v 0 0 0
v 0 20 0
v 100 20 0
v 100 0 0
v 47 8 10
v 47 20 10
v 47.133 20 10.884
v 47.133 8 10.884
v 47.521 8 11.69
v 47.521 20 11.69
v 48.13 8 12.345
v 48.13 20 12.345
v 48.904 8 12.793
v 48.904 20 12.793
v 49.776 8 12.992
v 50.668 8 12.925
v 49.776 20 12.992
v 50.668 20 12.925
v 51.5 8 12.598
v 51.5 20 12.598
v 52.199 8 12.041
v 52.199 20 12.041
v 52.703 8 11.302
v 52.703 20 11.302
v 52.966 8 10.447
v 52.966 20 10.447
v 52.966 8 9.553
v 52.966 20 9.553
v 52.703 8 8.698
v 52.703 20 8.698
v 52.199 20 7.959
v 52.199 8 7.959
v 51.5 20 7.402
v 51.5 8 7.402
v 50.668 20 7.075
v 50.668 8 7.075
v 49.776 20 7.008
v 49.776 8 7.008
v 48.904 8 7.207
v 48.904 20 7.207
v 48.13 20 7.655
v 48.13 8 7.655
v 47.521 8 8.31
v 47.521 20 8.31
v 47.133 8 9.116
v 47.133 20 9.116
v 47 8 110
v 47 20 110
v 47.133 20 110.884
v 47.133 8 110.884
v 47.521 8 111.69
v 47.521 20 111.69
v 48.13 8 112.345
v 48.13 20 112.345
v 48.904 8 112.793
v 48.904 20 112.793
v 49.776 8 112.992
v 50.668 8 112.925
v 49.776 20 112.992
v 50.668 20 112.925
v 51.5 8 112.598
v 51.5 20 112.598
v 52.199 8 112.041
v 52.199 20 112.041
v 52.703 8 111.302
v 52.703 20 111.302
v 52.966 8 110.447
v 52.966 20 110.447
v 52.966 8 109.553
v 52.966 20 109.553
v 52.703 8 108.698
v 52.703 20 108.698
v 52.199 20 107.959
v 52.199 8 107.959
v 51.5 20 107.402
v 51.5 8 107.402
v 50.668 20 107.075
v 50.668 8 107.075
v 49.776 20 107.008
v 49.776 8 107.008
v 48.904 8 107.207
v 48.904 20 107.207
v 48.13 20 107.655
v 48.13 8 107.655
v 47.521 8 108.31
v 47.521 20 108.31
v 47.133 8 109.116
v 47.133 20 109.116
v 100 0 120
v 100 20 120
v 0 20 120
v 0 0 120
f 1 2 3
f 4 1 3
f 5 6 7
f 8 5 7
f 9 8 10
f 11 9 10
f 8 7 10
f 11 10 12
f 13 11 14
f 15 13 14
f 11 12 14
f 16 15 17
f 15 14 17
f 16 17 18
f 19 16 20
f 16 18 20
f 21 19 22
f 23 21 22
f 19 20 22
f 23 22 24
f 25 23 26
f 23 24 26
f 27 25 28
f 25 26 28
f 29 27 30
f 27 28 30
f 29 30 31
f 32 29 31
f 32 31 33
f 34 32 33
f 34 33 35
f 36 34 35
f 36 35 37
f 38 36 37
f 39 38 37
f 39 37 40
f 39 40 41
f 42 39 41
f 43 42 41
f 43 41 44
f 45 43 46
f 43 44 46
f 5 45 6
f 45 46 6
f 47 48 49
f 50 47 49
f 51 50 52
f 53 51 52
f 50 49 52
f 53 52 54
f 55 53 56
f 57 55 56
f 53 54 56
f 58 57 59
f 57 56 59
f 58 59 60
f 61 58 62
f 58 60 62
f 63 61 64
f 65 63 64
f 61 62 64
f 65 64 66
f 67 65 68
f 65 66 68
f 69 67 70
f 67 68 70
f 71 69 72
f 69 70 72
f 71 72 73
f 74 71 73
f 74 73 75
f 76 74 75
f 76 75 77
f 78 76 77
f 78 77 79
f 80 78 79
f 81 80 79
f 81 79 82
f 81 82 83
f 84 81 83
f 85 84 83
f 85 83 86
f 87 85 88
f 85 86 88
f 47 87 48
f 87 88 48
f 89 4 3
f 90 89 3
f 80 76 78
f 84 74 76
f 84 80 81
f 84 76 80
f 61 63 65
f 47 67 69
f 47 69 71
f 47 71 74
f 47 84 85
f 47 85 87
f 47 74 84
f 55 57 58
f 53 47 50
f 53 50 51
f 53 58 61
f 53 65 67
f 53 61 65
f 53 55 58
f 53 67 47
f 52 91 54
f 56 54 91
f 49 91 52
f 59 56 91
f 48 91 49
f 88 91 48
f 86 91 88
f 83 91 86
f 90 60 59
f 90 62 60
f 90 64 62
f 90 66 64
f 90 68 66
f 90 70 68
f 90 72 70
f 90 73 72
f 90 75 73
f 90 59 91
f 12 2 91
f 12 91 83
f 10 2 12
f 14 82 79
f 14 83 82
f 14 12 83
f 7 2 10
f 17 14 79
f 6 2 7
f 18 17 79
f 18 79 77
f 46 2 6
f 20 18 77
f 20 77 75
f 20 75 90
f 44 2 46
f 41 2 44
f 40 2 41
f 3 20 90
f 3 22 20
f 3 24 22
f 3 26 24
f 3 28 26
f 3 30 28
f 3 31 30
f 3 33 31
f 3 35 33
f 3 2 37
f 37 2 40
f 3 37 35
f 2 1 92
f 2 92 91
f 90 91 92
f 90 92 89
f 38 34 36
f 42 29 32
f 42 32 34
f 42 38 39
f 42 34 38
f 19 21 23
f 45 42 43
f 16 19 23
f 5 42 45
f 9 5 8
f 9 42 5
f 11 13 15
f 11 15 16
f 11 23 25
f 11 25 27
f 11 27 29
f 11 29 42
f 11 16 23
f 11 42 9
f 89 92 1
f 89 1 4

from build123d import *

# Parameters (mm, degrees)
F0_W     = 100
F0_H     = 20
F1_DEPTH = 120
F2_R     = 3
F3_DEPTH = 12
F4_R     = 3
F5_DEPTH = 12


with BuildPart() as f1:
    # F0 (on Top) → F1 (new body)
    with BuildSketch(Plane.XY):
        with Locations((50, 10)):
            Rectangle(F0_W, F0_H)
    extrude(amount=F1_DEPTH)

    # F2 (on face) → F3 (cut)
    with BuildSketch(Plane(origin=(0, 20, 0), x_dir=(-1, 0, 0), z_dir=(0, 1, 0))):
        with Locations((-50, 110)):
            Circle(F2_R)
    extrude(amount=-F3_DEPTH, mode=Mode.SUBTRACT)

    # F4 (on face) → F5 (cut)
    with BuildSketch(Plane(origin=(0, 20, 0), x_dir=(-1, 0, 0), z_dir=(0, 1, 0))):
        with Locations((-50, 10)):
            Circle(F4_R)
    extrude(amount=-F5_DEPTH, mode=Mode.SUBTRACT)


solid = f1.part
